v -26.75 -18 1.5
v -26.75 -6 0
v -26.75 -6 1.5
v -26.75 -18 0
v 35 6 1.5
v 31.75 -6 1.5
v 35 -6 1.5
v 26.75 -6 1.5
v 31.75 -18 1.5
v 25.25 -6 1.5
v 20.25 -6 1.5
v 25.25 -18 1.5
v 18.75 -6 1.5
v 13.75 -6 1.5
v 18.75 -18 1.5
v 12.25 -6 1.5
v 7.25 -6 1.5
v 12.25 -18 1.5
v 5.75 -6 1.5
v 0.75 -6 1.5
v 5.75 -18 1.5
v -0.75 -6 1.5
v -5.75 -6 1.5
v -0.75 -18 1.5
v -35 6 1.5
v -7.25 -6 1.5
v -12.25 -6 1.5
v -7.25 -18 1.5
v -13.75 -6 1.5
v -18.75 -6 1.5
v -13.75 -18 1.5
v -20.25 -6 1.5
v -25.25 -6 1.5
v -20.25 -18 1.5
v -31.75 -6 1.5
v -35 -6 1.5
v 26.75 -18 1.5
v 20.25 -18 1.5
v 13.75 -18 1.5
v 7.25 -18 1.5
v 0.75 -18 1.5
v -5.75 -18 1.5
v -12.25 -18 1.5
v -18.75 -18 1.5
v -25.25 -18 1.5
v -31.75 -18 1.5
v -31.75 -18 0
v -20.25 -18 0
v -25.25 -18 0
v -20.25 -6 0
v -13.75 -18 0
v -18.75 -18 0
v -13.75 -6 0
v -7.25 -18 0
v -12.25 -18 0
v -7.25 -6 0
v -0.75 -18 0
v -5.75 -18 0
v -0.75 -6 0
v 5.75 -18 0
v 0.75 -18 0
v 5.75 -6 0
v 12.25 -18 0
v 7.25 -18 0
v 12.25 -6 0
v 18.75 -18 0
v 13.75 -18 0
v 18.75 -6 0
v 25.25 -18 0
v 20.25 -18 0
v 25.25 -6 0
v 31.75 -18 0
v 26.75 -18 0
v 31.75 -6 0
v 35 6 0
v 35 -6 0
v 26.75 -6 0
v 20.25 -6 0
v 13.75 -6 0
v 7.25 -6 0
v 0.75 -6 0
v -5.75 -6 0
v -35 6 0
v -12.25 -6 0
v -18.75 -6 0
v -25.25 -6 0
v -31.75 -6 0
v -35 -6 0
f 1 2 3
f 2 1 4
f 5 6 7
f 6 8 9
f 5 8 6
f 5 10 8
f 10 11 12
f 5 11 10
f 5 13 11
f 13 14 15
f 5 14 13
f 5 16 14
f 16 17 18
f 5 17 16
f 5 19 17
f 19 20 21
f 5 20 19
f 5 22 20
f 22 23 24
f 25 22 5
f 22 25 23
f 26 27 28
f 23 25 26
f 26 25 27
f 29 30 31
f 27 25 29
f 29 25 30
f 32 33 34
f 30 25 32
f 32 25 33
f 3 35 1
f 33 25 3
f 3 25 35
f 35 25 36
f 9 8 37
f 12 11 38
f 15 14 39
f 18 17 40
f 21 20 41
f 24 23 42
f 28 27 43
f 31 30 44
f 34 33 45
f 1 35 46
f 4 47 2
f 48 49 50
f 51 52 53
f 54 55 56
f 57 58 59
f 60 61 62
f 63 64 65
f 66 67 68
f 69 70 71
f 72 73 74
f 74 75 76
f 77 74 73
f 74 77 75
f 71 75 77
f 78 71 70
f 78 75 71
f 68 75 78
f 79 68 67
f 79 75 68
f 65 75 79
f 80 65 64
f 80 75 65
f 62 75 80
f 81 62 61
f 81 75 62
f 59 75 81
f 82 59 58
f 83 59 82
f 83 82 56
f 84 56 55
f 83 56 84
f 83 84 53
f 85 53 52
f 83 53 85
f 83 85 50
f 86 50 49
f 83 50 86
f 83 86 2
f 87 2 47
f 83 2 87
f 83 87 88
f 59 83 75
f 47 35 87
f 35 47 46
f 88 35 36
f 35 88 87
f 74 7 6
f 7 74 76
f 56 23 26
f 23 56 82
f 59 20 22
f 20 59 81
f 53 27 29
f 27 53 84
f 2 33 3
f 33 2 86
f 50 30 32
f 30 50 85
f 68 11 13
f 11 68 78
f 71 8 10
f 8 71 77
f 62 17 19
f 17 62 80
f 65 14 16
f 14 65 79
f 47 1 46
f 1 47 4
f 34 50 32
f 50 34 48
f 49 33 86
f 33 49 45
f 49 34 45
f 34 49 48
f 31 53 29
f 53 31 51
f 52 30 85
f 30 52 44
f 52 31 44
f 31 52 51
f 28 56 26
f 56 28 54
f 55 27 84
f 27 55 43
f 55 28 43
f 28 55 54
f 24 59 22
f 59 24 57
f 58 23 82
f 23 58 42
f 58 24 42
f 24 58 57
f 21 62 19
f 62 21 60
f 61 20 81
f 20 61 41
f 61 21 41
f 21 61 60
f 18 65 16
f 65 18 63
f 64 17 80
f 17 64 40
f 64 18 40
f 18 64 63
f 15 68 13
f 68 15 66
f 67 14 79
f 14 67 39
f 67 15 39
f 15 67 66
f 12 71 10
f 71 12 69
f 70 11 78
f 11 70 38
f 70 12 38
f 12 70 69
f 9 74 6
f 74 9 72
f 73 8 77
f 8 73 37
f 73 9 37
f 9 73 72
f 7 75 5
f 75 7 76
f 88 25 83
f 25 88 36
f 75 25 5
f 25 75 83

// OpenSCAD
// --------------- Parameters (mm) ----------------
// Spine (back bar) dimensions
spine_length = 70;        // length along X
spine_width  = 12;        // width along Y
spine_thick = 1.5;        // thickness along Z

// Tooth dimensions
tooth_width  = 5.0;       // width along X
tooth_len    = 12.0;      // length extending beyond spine in -Y
gap_between = 1.5;        // gap between adjacent teeth

num_teeth = 10;           // number of teeth

// --------------- Computed values ----------------
total_tooth_span = num_teeth*tooth_width + (num_teeth-1)*gap_between; // total X span of teeth
x_offset = -total_tooth_span/2;   // leftmost tooth edge, centered on spine

// --------------- Rendering ----------------
$fn = 64;   // smoothness for any curved primitives (not used here)

module spine() {
    // Spine plate, centered on origin, lying on Z=0
    translate([-spine_length/2, -spine_width/2, 0])
        cube([spine_length, spine_width, spine_thick]);
}

module teeth() {
    // Generate each tooth with a for‑loop
    for (i = [0 : num_teeth-1]) {
        x_pos = x_offset + i*(tooth_width + gap_between);
        // Position: start at spine's -Y edge (-spine_width/2) and extend -tooth_len
        translate([x_pos, -spine_width/2 - tooth_len, 0])
            cube([tooth_width, tooth_len, spine_thick]);
    }
}

union() {
    spine();
    teeth();
}
